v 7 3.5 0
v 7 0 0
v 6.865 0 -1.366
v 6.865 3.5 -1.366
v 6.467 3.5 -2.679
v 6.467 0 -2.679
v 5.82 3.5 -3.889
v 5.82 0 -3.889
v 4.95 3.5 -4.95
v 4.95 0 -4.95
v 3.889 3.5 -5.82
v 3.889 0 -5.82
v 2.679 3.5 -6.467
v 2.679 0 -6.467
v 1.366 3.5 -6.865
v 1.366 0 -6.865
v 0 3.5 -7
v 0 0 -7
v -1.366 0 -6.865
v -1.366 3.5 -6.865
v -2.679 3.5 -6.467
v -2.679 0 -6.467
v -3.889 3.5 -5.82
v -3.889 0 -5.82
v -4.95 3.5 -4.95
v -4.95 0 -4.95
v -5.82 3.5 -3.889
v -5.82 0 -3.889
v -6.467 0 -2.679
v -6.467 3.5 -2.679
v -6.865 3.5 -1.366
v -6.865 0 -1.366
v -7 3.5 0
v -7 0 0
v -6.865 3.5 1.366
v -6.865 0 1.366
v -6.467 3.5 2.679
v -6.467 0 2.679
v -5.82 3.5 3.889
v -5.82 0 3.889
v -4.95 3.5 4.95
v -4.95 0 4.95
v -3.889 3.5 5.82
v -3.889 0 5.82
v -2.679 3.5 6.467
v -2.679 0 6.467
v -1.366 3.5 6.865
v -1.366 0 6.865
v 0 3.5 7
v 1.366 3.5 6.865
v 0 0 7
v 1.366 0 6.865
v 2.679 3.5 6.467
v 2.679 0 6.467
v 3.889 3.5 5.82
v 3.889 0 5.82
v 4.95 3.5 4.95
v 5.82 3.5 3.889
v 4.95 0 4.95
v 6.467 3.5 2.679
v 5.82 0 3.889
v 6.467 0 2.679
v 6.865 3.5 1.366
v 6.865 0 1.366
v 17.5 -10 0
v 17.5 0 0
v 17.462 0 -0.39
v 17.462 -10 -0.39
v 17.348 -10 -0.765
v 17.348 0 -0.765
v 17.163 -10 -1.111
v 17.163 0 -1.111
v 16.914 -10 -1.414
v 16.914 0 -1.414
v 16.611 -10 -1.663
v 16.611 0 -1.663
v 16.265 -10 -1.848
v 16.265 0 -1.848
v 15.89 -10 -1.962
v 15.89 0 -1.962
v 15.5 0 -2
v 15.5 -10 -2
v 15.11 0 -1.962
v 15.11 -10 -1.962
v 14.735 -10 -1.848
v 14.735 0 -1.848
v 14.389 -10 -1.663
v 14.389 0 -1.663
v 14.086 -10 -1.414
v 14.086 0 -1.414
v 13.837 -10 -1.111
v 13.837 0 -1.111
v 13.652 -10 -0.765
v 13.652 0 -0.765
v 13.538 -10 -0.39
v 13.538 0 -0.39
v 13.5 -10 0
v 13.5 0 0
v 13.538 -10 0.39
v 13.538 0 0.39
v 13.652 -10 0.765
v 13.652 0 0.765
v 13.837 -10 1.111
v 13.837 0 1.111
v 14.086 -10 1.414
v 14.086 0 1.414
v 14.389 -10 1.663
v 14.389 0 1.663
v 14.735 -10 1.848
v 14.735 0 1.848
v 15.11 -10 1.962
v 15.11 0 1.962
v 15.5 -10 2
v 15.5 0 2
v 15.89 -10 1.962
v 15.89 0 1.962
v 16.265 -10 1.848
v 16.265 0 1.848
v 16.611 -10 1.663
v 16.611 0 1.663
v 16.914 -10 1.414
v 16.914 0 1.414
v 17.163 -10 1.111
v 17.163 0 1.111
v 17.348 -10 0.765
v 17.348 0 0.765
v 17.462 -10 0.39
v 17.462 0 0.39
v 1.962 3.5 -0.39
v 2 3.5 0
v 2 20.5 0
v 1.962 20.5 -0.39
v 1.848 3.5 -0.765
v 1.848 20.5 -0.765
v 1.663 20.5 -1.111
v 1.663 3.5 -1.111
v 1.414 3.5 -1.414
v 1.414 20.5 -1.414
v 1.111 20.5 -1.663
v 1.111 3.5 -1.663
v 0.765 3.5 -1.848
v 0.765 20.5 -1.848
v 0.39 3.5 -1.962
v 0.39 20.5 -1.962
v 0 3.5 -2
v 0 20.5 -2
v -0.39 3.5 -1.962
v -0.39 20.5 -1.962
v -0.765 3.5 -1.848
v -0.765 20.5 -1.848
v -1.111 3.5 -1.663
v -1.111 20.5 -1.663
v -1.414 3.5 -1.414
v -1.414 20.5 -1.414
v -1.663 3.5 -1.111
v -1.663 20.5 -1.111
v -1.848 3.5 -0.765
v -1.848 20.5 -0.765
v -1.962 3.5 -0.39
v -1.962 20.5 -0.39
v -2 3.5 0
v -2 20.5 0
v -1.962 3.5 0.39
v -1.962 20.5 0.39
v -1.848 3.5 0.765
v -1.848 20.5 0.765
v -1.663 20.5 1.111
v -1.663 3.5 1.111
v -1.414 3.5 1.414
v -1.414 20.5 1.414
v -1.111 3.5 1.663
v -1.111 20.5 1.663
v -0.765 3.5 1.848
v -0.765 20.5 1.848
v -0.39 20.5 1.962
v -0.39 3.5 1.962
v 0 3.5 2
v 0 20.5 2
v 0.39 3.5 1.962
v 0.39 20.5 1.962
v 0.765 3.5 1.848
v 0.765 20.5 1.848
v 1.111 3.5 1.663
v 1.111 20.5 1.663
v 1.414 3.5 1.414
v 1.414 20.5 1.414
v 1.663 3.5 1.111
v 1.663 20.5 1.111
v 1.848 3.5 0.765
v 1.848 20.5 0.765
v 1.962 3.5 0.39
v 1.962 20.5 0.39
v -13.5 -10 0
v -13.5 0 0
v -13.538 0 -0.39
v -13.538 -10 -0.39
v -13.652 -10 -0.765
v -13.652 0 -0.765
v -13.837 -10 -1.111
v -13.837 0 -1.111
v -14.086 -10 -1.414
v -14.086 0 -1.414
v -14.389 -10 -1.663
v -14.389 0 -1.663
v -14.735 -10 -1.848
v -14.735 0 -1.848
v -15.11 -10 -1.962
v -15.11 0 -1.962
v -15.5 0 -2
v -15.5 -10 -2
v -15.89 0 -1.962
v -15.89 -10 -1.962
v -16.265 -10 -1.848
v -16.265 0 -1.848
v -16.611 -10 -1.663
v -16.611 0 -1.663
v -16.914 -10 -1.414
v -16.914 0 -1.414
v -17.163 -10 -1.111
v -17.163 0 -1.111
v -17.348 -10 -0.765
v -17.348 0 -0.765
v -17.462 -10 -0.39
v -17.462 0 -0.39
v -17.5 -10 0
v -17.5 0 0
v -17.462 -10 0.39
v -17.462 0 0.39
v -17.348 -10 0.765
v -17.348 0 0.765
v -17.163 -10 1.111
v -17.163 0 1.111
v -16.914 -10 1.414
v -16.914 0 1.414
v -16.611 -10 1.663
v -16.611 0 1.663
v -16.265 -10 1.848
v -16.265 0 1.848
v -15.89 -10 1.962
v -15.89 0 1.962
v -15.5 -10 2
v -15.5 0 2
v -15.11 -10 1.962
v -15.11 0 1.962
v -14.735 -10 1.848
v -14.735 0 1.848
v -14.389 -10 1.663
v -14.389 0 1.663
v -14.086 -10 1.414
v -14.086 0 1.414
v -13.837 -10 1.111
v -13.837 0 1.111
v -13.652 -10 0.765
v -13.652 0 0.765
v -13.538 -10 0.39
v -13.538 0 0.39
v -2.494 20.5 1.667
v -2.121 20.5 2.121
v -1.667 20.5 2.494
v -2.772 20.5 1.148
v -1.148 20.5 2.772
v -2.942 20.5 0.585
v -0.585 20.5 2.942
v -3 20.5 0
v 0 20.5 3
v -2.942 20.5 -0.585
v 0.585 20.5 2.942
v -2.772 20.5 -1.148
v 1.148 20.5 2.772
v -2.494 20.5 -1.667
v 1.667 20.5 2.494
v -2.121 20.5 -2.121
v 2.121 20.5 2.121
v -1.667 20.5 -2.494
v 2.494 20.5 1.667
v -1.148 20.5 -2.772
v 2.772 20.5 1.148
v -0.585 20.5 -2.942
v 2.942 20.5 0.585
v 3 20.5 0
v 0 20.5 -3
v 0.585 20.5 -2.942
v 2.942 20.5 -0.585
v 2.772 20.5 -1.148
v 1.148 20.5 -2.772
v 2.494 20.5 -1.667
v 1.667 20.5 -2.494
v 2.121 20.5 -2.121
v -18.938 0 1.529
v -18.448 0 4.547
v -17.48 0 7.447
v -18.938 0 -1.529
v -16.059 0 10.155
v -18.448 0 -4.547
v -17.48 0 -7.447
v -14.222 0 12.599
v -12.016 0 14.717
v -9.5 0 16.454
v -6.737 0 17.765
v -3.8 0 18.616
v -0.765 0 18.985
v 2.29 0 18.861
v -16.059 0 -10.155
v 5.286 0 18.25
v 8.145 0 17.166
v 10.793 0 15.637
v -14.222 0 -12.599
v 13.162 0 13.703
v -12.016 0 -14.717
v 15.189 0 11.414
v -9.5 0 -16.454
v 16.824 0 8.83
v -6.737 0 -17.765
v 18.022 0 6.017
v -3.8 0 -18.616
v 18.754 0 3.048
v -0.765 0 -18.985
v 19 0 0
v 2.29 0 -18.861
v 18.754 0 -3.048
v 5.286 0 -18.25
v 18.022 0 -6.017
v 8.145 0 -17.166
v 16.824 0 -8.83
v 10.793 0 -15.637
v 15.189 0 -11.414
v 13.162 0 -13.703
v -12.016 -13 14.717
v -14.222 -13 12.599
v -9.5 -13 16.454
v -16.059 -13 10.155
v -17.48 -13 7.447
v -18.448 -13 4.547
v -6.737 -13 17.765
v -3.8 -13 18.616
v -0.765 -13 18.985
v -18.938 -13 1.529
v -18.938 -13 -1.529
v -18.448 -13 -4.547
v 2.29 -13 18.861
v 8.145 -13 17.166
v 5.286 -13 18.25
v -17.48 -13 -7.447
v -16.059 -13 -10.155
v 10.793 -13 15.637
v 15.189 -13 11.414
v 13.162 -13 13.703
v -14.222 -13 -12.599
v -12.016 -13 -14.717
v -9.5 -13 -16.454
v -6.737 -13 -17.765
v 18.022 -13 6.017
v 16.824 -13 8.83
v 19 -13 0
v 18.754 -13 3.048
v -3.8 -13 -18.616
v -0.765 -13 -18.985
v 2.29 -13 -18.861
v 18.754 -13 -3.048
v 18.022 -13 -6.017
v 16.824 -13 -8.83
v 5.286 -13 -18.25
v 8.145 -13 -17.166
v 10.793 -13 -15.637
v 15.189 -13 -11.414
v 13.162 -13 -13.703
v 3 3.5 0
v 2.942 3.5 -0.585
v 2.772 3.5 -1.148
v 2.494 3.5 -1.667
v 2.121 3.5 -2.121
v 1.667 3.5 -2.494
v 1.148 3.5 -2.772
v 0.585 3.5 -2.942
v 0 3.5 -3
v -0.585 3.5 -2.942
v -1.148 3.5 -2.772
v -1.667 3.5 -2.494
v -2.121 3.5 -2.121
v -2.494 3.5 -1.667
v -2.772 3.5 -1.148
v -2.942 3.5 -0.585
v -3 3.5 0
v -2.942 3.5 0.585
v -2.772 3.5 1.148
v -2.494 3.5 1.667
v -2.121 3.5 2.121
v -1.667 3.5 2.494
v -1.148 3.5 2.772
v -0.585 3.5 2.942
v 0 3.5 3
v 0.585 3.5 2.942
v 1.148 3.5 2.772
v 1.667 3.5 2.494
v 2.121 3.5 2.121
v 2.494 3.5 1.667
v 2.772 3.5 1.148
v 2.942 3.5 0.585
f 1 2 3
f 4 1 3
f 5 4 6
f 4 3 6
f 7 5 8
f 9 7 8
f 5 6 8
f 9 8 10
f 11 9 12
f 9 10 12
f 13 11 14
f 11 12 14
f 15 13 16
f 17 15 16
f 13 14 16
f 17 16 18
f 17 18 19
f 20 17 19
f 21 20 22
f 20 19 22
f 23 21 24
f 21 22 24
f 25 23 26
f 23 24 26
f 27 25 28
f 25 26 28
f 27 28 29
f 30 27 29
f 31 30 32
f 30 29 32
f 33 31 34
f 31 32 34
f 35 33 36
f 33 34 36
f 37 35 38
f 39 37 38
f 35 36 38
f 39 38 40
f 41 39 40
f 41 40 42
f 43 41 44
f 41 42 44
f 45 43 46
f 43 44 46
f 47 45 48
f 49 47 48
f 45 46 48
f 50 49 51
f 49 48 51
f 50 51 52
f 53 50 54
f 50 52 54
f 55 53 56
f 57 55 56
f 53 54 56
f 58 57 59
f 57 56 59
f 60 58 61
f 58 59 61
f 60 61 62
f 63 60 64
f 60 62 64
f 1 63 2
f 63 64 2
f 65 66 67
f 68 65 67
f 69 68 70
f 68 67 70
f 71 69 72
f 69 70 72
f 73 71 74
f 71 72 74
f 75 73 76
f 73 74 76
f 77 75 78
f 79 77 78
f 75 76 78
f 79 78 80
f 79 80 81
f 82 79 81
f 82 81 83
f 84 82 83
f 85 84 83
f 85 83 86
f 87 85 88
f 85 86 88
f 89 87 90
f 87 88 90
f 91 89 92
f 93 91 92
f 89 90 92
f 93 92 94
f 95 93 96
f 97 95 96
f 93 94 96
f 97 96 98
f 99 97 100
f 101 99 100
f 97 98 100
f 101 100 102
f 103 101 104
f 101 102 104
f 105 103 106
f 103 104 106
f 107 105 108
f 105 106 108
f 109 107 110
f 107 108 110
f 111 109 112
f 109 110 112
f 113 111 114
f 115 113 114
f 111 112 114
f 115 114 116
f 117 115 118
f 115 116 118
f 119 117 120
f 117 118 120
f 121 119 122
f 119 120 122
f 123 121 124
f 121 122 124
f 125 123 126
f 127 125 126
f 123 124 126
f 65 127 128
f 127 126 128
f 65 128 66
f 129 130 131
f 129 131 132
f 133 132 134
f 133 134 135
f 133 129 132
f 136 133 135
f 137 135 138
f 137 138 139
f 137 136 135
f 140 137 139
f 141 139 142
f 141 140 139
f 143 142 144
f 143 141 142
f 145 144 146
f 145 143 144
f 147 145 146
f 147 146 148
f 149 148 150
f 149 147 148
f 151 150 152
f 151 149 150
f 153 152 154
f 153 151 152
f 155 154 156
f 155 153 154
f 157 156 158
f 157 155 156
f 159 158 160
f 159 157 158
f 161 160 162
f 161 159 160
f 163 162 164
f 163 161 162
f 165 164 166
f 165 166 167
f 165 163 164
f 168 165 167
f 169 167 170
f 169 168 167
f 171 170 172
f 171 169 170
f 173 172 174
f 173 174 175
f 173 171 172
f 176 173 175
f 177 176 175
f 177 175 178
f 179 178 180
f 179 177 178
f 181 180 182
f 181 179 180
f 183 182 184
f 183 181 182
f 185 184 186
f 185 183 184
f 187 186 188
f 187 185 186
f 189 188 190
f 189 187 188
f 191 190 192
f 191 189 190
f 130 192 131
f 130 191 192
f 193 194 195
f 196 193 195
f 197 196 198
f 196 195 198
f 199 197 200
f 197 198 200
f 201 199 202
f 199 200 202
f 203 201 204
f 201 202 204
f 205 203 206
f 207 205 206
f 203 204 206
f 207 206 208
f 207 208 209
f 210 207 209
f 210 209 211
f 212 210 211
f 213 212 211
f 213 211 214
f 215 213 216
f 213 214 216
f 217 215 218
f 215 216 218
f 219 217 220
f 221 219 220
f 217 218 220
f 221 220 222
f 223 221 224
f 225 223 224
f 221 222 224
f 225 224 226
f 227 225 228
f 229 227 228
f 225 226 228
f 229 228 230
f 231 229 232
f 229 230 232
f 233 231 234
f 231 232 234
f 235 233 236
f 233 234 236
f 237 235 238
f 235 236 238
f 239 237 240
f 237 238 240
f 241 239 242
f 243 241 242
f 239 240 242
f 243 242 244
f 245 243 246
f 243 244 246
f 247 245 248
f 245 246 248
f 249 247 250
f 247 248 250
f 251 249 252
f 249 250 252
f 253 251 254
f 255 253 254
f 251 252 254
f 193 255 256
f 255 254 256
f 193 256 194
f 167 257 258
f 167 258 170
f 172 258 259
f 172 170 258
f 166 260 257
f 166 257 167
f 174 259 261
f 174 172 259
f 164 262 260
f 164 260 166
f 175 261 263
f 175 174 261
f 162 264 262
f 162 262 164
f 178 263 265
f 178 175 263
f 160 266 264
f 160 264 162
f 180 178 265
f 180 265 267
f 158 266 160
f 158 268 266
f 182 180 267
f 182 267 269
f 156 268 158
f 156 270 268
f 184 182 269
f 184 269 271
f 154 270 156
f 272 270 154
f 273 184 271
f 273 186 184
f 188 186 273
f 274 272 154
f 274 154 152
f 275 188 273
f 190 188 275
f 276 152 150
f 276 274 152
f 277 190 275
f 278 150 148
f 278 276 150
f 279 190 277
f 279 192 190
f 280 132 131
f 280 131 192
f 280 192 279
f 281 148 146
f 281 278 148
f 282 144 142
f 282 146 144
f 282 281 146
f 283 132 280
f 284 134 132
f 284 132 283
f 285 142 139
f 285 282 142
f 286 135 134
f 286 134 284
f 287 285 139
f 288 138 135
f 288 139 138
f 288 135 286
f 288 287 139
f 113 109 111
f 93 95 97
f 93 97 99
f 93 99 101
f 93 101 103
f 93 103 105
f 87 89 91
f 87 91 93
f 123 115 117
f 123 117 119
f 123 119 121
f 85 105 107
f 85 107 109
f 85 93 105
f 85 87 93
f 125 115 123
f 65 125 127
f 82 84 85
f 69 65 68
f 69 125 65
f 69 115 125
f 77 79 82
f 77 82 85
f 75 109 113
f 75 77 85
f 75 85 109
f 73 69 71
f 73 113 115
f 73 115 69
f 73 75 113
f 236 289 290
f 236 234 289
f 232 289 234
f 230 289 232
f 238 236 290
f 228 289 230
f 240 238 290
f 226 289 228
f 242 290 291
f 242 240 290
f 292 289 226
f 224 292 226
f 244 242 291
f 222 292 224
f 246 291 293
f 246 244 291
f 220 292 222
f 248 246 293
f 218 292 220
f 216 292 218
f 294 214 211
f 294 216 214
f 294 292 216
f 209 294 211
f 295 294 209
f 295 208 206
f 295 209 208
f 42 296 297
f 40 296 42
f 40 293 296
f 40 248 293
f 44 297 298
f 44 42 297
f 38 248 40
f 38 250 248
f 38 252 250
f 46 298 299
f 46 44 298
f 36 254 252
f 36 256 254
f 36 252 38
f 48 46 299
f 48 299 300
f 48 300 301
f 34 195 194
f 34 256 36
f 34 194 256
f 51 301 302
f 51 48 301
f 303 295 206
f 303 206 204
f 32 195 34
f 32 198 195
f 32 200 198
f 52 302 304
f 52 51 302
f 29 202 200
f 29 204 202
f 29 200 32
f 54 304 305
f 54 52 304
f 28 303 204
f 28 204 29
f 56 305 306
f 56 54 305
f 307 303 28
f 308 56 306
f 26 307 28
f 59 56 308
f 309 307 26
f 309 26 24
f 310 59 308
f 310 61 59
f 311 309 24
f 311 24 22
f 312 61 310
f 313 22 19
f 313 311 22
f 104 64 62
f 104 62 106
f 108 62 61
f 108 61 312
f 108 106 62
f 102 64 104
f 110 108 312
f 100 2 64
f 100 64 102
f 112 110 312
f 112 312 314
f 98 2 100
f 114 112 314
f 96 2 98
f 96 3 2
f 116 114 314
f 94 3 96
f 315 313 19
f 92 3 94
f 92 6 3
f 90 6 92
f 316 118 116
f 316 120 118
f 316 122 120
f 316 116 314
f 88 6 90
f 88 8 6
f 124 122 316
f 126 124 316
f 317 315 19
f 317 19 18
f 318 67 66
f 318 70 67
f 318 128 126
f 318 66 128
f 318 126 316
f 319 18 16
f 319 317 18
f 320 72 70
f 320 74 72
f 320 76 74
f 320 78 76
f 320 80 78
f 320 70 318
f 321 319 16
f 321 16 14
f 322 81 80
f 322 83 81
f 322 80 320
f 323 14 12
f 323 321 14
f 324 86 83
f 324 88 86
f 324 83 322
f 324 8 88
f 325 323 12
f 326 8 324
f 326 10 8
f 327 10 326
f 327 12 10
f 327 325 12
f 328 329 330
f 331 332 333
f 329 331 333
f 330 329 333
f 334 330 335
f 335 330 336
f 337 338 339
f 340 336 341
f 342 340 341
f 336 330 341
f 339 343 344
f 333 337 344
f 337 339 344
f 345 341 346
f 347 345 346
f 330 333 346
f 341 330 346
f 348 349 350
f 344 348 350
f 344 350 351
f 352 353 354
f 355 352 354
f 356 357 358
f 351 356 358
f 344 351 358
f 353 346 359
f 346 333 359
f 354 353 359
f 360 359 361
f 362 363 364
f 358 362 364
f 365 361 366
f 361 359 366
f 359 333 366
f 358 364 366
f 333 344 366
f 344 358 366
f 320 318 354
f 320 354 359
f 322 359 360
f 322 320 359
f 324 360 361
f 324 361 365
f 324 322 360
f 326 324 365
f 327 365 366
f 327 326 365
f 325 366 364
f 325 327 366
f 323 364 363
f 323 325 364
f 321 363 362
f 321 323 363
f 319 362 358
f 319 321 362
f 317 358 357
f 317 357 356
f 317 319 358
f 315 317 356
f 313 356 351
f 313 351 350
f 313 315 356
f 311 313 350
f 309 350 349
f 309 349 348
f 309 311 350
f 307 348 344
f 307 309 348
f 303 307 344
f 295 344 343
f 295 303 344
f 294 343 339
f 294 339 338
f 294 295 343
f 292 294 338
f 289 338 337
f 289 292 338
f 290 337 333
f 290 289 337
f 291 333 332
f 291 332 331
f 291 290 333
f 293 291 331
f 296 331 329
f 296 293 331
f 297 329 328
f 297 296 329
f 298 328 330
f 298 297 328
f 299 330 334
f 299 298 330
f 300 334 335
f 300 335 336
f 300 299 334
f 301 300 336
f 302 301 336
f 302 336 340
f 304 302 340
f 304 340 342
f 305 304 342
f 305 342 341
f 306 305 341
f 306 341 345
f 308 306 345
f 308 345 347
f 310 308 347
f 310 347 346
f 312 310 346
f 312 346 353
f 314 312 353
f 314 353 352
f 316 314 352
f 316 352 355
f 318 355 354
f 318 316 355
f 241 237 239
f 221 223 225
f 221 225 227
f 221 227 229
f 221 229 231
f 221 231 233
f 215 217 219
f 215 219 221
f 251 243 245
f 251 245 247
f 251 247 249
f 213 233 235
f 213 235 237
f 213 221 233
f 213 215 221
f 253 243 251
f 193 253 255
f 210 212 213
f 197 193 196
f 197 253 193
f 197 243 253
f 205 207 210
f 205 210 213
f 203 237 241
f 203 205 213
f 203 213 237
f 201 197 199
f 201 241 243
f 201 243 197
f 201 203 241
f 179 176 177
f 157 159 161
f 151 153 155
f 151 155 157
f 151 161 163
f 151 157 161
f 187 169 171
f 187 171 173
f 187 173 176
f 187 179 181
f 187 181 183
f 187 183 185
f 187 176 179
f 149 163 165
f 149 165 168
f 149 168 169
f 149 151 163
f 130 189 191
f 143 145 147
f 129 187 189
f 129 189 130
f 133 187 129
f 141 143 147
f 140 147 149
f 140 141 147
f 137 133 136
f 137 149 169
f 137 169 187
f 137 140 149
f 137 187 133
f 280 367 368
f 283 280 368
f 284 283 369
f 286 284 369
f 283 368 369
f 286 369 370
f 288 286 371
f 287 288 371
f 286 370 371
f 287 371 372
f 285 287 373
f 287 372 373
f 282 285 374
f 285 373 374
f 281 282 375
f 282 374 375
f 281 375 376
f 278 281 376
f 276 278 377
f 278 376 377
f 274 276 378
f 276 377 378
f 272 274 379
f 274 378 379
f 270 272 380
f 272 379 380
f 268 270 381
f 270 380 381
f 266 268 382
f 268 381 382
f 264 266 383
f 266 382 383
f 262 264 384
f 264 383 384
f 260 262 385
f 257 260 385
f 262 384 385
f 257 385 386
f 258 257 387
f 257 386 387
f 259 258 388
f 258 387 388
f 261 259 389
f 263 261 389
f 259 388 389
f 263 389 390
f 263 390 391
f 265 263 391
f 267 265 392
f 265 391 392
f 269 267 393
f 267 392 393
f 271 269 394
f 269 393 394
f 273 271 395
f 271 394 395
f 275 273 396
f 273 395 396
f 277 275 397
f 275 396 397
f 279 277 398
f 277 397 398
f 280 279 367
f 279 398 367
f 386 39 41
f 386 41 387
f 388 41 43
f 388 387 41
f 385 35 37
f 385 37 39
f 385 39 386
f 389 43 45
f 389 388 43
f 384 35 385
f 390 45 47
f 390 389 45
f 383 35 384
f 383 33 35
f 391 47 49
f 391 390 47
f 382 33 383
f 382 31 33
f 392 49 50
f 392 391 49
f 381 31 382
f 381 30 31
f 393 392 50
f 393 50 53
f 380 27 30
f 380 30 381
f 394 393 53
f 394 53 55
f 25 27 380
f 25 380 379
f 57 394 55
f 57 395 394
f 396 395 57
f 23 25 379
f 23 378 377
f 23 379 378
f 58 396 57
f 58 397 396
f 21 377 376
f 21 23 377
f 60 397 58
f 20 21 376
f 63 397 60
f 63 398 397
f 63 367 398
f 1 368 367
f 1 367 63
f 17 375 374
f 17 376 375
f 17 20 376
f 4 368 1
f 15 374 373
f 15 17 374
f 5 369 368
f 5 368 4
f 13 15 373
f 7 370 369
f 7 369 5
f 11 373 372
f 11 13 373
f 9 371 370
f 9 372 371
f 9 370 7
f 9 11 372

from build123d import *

# Parameters (mm, degrees)
IZIM1_R                     = 19
Y_KSEKLIK_EKSTR_ZYON1_DEPTH = 13
IZIM2_R                     = 2
KES_EKSTR_ZYON1_DEPTH       = 10
IZIM3_R                     = 7
Y_KSEKLIK_EKSTR_ZYON2_DEPTH = 3.5
IZIM4_R                     = 3
IZIM4_R_2                   = 2
Y_KSEKLIK_EKSTR_ZYON3_DEPTH = 17


with BuildPart() as part:
    # Çizim1 → Yükseklik-Ekstrüzyon1 (new body)
    with BuildSketch(Plane(origin=(0, 0, 0), x_dir=(1, 0, 0), z_dir=(0, 1, 0))):
        Circle(IZIM1_R)
    extrude(amount=-Y_KSEKLIK_EKSTR_ZYON1_DEPTH)

    # Çizim2 → Kes-Ekstrüzyon1 (cut)
    with BuildSketch(Plane(origin=(0, 0, 0), x_dir=(1, 0, 0), z_dir=(0, 1, 0))):
        with Locations((-15.5, 0)):
            Circle(IZIM2_R)
        with Locations((15.5, 0)):
            Circle(IZIM2_R)
    extrude(amount=-KES_EKSTR_ZYON1_DEPTH, mode=Mode.SUBTRACT)

    # Çizim3 → Yükseklik-Ekstrüzyon2 (add)
    with BuildSketch(Plane(origin=(0, 0, 0), x_dir=(1, 0, 0), z_dir=(0, 1, 0))):
        Circle(IZIM3_R)
    extrude(amount=Y_KSEKLIK_EKSTR_ZYON2_DEPTH)

    # Çizim4 → Yükseklik-Ekstrüzyon3 (add)
    with BuildSketch(Plane(origin=(0, 3.5, 0), x_dir=(1, 0, 0), z_dir=(0, 1, 0))):
        Circle(IZIM4_R)
        Circle(IZIM4_R_2, mode=Mode.SUBTRACT)
    extrude(amount=Y_KSEKLIK_EKSTR_ZYON3_DEPTH)


solid = part.part
